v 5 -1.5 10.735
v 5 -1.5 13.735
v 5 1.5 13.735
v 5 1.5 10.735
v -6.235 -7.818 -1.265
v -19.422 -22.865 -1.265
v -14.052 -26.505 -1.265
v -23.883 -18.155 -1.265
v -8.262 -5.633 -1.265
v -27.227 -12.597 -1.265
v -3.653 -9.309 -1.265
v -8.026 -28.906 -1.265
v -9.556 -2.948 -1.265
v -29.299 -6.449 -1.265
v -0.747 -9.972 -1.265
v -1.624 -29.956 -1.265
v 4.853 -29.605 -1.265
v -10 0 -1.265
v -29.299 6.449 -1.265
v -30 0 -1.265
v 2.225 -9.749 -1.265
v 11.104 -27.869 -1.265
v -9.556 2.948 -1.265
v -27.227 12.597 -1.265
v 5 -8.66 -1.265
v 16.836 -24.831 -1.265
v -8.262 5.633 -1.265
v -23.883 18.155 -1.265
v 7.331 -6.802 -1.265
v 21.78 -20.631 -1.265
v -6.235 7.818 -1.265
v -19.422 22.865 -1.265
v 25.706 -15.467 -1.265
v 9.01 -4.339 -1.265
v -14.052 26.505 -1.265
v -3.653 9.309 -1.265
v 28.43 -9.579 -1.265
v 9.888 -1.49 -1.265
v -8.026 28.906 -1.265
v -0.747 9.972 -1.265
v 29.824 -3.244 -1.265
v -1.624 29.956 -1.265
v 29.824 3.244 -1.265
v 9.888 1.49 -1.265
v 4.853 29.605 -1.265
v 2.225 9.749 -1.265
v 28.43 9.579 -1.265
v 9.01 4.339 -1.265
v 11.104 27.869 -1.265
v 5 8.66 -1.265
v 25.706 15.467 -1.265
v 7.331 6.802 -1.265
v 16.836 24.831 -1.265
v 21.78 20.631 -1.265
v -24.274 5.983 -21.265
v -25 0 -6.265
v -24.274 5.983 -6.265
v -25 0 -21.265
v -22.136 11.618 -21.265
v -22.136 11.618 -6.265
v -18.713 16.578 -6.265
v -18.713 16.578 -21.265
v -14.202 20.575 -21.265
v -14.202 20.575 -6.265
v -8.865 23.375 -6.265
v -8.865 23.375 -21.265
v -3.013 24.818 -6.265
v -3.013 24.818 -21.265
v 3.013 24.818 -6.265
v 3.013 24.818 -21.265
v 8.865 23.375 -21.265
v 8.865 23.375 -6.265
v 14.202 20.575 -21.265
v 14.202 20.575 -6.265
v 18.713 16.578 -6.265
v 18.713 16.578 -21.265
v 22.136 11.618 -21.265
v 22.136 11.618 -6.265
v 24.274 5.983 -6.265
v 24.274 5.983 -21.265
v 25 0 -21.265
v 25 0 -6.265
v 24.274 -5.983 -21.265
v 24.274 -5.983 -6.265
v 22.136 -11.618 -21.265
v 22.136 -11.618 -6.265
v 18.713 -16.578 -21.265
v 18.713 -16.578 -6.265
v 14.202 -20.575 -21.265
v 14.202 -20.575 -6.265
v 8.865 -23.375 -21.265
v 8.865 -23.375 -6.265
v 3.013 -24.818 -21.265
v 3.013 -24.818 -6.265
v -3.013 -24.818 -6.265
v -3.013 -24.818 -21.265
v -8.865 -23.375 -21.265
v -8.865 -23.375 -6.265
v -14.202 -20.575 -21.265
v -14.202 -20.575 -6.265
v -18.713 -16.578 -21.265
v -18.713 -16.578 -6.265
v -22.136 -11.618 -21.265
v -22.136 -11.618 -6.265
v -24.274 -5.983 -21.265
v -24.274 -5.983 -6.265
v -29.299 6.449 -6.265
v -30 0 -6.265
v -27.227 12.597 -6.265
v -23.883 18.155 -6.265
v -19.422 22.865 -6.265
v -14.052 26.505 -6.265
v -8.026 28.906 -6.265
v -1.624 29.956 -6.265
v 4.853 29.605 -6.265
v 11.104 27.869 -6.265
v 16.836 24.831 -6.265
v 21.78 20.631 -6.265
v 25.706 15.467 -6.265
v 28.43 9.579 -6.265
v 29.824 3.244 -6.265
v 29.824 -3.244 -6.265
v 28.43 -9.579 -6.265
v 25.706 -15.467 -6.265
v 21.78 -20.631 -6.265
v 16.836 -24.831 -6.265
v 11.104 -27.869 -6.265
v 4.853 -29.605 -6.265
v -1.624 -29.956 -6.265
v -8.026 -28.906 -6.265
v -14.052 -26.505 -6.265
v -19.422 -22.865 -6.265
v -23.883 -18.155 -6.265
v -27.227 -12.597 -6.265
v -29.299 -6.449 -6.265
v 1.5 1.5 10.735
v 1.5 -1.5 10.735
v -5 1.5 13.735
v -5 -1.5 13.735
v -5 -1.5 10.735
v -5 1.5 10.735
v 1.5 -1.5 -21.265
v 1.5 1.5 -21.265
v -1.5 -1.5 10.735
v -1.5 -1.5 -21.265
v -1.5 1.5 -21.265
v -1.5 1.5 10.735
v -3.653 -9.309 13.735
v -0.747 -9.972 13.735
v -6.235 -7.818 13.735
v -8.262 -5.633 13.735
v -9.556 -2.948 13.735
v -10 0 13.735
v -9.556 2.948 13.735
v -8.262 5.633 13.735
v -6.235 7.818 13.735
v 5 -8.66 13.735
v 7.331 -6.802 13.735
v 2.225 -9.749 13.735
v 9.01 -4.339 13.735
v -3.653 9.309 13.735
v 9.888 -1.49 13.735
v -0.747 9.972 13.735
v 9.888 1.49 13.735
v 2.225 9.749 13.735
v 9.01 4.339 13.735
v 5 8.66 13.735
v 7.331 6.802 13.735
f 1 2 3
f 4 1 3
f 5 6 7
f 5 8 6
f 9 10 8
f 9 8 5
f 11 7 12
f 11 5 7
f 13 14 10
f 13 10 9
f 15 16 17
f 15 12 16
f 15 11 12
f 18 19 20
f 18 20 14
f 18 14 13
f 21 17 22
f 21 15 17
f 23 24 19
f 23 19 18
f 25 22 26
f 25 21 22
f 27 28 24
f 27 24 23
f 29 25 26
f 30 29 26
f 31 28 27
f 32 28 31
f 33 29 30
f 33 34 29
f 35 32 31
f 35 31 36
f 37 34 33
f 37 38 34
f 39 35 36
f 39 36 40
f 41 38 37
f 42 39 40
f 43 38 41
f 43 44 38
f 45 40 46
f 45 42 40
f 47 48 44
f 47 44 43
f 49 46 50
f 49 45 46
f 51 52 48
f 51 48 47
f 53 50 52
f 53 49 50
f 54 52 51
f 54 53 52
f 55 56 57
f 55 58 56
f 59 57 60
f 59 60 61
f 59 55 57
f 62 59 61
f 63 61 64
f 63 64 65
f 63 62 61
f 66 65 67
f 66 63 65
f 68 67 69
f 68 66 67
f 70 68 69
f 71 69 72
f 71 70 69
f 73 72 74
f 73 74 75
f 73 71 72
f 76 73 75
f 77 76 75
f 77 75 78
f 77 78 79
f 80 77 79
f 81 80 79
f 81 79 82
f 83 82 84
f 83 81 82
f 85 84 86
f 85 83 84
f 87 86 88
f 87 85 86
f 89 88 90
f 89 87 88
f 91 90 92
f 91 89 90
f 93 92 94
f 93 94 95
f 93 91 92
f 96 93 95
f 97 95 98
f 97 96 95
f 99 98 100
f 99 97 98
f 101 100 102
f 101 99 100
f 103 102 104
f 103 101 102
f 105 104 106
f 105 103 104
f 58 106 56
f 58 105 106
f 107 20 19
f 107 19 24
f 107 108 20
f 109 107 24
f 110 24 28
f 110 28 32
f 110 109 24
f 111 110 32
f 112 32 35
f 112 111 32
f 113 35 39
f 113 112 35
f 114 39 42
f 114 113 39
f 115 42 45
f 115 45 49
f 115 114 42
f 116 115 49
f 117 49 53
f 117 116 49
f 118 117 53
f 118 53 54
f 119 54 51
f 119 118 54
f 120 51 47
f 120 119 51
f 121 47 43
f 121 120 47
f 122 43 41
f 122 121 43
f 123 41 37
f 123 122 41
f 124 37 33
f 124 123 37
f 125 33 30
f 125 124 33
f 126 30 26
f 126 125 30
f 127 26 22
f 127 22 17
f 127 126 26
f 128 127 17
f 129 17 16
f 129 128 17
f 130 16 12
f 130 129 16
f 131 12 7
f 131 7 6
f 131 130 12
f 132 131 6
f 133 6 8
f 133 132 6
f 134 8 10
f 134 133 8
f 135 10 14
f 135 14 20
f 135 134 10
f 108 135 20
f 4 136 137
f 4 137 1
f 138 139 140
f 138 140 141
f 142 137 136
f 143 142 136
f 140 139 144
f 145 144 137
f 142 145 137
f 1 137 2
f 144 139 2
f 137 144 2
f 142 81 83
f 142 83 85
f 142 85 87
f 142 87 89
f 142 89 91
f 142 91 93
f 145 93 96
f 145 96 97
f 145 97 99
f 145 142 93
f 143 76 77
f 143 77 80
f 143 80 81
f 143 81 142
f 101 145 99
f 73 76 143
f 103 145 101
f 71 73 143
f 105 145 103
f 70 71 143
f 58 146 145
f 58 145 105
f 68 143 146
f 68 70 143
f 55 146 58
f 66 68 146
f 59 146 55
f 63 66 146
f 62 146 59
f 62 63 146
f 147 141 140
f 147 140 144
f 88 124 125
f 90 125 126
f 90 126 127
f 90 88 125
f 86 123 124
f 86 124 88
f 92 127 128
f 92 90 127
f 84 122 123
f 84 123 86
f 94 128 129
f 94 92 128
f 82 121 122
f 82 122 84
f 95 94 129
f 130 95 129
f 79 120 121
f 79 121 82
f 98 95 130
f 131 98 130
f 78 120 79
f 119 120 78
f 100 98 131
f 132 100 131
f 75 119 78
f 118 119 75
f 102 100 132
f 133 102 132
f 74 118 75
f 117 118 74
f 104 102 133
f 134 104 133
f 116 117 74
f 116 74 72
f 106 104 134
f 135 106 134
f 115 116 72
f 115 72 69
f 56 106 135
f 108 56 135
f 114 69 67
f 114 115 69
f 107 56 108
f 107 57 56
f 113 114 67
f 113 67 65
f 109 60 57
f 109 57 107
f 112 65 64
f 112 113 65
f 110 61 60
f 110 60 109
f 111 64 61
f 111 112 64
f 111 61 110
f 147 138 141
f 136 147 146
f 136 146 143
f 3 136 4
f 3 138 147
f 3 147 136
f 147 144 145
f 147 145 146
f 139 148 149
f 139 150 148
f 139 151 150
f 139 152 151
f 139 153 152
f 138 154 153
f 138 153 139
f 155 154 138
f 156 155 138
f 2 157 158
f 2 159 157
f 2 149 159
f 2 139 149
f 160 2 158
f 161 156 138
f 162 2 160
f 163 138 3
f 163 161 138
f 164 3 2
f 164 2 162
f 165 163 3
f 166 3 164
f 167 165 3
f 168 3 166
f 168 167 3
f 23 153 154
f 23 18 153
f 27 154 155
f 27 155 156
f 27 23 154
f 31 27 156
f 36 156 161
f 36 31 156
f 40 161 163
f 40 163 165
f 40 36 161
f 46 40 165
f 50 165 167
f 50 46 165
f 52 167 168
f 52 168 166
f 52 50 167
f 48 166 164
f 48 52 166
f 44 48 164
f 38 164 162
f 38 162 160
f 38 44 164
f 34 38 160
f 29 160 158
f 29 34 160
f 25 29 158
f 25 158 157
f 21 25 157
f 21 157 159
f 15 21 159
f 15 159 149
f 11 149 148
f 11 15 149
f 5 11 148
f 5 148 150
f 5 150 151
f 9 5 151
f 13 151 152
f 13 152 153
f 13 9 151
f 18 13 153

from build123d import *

# Parameters (mm, degrees)
F2_W     = 10
F2_H     = 3
F3_DEPTH = 3
F4_W     = 3
F4_H     = 3
F5_DEPTH = 40


with BuildPart() as f1:
    # F0 (on Front) → F1 (revolve)
    with BuildSketch(Plane.XZ):
        Polygon((0, 13.734525), (-1.5, 13.734525), (-10, 13.734525), (-10, -1.265475), (-25, -1.265475), (-30, -1.265475), (-30, -6.265475), (-25, -6.265475), (-25, -21.265475), (0, -21.265475), (0, 9.622872), align=None)
    revolve(axis=Axis((0, 0, 2.372262), (0, 0, -1)))

    # F2 (on face) → F3 (cut)
    with BuildSketch(Plane.XY.offset(13.734525)):
        Rectangle(F2_W, F2_H)
    extrude(amount=-F3_DEPTH, mode=Mode.SUBTRACT)

    # F4 (on face) → F5 (cut)
    with BuildSketch(Plane.XY.offset(10.734525)):
        Rectangle(F4_W, F4_H)
    extrude(amount=-F5_DEPTH, mode=Mode.SUBTRACT)


solid = f1.part
